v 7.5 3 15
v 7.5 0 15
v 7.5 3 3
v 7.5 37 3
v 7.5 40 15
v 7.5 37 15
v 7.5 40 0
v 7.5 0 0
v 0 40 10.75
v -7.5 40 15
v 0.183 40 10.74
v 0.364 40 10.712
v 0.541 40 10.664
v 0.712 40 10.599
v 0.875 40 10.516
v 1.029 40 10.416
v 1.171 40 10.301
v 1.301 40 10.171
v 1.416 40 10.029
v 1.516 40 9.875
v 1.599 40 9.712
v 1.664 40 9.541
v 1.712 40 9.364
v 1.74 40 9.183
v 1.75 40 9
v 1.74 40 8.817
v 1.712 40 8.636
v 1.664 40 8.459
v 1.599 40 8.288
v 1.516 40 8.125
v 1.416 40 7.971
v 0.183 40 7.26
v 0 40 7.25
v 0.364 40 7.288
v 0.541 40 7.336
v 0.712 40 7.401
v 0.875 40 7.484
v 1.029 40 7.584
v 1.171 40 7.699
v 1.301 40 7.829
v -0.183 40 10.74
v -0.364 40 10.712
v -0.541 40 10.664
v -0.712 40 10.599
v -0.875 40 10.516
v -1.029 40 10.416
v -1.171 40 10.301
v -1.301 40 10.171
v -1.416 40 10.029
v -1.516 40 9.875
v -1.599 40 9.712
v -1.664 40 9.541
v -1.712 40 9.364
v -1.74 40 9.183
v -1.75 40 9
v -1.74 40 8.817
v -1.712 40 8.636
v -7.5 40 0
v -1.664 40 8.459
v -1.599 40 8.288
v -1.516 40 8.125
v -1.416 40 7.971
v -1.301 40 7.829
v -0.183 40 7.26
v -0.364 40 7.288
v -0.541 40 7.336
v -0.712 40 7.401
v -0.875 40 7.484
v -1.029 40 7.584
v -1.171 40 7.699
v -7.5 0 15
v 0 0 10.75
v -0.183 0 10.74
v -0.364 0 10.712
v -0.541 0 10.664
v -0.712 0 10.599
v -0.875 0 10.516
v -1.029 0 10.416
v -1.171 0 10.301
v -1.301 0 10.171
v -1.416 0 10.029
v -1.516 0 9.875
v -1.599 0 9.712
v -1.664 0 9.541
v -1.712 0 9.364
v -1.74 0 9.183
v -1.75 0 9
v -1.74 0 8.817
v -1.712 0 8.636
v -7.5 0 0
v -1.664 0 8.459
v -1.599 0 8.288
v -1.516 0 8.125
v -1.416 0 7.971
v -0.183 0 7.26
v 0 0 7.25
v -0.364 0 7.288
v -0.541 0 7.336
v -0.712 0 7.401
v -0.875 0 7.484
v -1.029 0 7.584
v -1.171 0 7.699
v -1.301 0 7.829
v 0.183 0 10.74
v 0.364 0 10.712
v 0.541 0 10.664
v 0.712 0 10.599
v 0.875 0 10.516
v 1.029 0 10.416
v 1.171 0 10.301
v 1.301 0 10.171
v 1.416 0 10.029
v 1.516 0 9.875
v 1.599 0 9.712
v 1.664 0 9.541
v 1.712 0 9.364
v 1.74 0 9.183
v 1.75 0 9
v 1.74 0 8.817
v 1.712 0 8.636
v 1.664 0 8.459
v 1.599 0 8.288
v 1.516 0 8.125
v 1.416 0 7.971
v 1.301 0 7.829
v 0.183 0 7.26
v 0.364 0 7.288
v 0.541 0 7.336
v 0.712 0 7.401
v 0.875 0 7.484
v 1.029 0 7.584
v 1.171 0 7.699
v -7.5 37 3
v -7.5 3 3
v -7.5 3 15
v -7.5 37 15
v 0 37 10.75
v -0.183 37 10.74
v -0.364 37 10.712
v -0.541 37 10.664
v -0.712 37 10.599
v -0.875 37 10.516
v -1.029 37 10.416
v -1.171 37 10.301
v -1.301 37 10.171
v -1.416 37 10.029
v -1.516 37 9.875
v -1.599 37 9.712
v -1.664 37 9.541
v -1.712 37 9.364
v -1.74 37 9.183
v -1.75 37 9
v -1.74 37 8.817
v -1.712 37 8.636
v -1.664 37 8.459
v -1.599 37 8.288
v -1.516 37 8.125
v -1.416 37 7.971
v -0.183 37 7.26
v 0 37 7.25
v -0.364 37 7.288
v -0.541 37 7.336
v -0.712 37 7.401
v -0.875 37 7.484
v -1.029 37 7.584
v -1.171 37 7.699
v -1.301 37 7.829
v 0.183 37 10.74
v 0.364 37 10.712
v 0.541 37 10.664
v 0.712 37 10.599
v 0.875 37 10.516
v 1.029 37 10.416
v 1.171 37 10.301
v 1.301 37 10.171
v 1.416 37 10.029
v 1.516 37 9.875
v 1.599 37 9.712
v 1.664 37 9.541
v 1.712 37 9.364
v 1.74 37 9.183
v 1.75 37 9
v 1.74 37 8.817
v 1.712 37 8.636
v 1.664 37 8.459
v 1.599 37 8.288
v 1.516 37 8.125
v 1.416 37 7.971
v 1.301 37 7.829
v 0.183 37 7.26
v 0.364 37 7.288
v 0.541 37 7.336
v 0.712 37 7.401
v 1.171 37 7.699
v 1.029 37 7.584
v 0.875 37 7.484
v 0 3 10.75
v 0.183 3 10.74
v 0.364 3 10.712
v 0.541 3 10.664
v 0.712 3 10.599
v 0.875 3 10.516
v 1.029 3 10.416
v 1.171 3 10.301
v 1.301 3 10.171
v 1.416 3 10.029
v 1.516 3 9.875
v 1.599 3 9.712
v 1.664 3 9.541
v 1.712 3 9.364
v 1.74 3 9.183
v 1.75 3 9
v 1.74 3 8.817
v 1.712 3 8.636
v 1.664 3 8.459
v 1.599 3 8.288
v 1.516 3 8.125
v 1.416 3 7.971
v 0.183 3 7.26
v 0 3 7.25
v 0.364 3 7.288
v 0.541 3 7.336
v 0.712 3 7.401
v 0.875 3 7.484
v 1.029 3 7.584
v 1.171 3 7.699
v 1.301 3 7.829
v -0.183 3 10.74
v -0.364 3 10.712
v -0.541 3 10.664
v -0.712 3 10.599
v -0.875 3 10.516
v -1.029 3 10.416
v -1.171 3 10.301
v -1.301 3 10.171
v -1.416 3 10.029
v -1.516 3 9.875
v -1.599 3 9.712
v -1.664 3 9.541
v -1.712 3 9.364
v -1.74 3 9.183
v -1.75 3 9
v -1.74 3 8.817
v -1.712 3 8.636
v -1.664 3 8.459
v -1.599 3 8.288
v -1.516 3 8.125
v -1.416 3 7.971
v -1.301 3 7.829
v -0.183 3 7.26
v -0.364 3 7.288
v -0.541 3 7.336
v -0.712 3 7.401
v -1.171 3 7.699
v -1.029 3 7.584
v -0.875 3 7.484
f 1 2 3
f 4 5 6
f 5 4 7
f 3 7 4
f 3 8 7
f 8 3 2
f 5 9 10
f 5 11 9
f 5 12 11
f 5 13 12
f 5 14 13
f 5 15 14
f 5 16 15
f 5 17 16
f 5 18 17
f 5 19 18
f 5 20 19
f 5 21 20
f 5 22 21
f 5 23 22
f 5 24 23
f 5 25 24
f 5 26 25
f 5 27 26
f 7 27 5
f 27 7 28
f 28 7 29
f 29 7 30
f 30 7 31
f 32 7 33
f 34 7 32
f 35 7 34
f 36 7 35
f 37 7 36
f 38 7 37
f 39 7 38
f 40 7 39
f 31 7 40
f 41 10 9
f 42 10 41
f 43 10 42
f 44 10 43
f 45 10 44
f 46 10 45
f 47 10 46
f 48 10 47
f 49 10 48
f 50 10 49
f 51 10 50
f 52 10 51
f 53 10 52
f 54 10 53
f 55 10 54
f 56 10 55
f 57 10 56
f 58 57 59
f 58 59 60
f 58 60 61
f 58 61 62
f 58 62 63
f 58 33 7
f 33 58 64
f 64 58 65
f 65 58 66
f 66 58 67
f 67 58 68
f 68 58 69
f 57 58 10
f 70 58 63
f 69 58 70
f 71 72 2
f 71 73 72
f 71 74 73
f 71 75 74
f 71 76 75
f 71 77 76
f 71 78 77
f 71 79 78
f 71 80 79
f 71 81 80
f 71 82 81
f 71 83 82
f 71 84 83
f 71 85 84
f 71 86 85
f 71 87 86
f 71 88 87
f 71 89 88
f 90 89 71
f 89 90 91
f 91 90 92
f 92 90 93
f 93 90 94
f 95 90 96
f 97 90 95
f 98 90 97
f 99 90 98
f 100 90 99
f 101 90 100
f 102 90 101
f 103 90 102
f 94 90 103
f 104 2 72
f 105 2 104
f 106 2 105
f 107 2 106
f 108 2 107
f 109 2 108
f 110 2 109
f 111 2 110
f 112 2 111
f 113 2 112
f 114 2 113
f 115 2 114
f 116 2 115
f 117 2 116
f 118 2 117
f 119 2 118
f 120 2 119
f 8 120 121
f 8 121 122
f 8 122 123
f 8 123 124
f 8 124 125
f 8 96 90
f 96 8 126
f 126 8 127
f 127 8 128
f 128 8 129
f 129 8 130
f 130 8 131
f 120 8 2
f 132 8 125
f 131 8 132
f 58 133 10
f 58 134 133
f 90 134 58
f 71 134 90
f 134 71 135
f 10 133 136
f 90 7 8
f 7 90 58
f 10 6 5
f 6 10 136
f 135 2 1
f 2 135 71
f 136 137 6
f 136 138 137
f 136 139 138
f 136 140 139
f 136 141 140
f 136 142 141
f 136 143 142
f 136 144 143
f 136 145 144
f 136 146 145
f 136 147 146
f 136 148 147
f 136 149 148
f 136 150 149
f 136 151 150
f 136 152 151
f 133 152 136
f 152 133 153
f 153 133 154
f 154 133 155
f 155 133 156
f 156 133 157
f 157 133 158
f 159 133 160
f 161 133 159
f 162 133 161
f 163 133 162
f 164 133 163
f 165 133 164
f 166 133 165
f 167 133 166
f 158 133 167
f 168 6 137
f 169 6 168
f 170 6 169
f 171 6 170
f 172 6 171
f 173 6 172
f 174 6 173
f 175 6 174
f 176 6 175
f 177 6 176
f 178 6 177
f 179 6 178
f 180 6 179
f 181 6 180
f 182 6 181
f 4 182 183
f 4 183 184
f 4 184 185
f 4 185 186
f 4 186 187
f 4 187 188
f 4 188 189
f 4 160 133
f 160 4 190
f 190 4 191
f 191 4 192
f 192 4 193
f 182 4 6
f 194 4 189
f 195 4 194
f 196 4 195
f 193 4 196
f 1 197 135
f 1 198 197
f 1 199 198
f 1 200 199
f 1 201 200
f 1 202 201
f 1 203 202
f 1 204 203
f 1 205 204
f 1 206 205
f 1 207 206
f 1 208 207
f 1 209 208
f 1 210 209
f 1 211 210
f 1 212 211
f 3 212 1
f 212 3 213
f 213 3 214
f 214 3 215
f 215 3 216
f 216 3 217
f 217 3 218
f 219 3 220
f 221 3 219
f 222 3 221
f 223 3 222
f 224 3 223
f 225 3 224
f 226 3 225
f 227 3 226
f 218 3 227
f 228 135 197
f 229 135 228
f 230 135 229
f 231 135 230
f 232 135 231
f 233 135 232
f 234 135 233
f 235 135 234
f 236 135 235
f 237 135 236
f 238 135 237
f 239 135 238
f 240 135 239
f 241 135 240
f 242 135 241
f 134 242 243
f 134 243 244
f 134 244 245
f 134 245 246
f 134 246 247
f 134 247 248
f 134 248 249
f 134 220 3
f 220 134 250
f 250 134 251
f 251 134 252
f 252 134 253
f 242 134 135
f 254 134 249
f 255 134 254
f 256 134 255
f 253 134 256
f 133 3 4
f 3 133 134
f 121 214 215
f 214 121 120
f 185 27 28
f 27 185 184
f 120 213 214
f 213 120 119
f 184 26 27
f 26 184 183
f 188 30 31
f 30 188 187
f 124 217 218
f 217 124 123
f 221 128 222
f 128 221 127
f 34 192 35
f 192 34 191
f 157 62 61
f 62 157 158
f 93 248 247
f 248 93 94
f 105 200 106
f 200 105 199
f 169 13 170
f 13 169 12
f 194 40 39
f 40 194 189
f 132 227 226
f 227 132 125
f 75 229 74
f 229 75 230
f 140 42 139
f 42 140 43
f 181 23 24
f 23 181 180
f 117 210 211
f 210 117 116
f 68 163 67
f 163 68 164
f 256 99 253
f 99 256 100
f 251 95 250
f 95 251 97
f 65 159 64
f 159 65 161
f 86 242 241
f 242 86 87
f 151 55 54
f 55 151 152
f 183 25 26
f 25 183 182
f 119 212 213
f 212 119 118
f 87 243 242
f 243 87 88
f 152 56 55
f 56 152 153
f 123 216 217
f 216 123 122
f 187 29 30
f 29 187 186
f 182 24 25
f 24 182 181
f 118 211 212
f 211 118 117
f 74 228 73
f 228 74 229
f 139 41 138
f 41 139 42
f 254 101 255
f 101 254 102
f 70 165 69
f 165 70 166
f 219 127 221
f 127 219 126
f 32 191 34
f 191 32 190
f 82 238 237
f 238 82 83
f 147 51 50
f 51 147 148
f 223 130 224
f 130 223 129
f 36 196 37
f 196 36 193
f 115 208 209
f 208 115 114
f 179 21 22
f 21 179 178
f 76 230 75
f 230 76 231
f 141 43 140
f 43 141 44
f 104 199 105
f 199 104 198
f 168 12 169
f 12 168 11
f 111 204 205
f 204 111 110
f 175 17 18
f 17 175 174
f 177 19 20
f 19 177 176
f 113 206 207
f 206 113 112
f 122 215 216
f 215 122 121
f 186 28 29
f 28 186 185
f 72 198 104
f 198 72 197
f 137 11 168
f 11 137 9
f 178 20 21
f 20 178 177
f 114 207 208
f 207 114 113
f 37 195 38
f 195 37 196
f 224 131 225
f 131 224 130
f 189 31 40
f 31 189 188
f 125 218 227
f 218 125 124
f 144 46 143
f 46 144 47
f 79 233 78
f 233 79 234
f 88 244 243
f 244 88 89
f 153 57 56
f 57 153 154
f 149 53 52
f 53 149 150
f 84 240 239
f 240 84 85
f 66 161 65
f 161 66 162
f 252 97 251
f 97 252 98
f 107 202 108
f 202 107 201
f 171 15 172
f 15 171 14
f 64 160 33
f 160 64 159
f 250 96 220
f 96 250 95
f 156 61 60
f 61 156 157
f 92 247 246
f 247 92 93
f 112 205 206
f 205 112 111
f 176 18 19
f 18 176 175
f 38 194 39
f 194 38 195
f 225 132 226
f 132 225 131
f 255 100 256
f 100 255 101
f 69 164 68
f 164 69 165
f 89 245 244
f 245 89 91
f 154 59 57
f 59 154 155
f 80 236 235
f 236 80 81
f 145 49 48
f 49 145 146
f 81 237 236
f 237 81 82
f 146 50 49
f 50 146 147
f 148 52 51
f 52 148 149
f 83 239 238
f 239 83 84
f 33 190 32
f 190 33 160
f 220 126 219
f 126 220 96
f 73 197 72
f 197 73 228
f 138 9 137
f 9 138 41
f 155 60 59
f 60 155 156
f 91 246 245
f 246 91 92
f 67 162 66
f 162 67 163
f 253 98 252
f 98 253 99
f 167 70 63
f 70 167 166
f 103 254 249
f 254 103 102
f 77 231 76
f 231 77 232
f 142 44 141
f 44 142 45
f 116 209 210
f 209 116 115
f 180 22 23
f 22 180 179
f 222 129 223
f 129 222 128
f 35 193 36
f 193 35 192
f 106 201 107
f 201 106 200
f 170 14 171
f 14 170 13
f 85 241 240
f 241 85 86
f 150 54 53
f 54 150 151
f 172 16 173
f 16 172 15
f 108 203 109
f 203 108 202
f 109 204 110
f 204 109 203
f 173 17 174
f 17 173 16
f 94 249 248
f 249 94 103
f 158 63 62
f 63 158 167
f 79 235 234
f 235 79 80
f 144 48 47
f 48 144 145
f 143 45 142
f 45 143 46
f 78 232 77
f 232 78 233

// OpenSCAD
// variables all in mm
screwDiam = 3;
spacerHeight = 40;
wall = 3;

// calculated vars
outerCube = [screwDiam + wall*2 + wall*2, 	
			screwDiam + wall*2 + wall*2, 		
			spacerHeight];					
				
innerCube = [outerCube.x, 			
			outerCube.y, 			
			spacerHeight - wall*2];		

// smooth cylinder		
$fn=60;	

// start code
translate([0, 0, (outerCube.y+wall)/2])
{
	rotate([270, 00, 0])
	{
		difference()
		{

			translate([-outerCube.x, -outerCube.y + wall]/2)
			{
				cube(outerCube);
			}

			translate([-innerCube.x/2, -innerCube.y/2 - wall/2, wall])
			{
				cube(innerCube);
			}

			cylinder(d = screwDiam + 0.5, h = spacerHeight);

		}
	}
}
